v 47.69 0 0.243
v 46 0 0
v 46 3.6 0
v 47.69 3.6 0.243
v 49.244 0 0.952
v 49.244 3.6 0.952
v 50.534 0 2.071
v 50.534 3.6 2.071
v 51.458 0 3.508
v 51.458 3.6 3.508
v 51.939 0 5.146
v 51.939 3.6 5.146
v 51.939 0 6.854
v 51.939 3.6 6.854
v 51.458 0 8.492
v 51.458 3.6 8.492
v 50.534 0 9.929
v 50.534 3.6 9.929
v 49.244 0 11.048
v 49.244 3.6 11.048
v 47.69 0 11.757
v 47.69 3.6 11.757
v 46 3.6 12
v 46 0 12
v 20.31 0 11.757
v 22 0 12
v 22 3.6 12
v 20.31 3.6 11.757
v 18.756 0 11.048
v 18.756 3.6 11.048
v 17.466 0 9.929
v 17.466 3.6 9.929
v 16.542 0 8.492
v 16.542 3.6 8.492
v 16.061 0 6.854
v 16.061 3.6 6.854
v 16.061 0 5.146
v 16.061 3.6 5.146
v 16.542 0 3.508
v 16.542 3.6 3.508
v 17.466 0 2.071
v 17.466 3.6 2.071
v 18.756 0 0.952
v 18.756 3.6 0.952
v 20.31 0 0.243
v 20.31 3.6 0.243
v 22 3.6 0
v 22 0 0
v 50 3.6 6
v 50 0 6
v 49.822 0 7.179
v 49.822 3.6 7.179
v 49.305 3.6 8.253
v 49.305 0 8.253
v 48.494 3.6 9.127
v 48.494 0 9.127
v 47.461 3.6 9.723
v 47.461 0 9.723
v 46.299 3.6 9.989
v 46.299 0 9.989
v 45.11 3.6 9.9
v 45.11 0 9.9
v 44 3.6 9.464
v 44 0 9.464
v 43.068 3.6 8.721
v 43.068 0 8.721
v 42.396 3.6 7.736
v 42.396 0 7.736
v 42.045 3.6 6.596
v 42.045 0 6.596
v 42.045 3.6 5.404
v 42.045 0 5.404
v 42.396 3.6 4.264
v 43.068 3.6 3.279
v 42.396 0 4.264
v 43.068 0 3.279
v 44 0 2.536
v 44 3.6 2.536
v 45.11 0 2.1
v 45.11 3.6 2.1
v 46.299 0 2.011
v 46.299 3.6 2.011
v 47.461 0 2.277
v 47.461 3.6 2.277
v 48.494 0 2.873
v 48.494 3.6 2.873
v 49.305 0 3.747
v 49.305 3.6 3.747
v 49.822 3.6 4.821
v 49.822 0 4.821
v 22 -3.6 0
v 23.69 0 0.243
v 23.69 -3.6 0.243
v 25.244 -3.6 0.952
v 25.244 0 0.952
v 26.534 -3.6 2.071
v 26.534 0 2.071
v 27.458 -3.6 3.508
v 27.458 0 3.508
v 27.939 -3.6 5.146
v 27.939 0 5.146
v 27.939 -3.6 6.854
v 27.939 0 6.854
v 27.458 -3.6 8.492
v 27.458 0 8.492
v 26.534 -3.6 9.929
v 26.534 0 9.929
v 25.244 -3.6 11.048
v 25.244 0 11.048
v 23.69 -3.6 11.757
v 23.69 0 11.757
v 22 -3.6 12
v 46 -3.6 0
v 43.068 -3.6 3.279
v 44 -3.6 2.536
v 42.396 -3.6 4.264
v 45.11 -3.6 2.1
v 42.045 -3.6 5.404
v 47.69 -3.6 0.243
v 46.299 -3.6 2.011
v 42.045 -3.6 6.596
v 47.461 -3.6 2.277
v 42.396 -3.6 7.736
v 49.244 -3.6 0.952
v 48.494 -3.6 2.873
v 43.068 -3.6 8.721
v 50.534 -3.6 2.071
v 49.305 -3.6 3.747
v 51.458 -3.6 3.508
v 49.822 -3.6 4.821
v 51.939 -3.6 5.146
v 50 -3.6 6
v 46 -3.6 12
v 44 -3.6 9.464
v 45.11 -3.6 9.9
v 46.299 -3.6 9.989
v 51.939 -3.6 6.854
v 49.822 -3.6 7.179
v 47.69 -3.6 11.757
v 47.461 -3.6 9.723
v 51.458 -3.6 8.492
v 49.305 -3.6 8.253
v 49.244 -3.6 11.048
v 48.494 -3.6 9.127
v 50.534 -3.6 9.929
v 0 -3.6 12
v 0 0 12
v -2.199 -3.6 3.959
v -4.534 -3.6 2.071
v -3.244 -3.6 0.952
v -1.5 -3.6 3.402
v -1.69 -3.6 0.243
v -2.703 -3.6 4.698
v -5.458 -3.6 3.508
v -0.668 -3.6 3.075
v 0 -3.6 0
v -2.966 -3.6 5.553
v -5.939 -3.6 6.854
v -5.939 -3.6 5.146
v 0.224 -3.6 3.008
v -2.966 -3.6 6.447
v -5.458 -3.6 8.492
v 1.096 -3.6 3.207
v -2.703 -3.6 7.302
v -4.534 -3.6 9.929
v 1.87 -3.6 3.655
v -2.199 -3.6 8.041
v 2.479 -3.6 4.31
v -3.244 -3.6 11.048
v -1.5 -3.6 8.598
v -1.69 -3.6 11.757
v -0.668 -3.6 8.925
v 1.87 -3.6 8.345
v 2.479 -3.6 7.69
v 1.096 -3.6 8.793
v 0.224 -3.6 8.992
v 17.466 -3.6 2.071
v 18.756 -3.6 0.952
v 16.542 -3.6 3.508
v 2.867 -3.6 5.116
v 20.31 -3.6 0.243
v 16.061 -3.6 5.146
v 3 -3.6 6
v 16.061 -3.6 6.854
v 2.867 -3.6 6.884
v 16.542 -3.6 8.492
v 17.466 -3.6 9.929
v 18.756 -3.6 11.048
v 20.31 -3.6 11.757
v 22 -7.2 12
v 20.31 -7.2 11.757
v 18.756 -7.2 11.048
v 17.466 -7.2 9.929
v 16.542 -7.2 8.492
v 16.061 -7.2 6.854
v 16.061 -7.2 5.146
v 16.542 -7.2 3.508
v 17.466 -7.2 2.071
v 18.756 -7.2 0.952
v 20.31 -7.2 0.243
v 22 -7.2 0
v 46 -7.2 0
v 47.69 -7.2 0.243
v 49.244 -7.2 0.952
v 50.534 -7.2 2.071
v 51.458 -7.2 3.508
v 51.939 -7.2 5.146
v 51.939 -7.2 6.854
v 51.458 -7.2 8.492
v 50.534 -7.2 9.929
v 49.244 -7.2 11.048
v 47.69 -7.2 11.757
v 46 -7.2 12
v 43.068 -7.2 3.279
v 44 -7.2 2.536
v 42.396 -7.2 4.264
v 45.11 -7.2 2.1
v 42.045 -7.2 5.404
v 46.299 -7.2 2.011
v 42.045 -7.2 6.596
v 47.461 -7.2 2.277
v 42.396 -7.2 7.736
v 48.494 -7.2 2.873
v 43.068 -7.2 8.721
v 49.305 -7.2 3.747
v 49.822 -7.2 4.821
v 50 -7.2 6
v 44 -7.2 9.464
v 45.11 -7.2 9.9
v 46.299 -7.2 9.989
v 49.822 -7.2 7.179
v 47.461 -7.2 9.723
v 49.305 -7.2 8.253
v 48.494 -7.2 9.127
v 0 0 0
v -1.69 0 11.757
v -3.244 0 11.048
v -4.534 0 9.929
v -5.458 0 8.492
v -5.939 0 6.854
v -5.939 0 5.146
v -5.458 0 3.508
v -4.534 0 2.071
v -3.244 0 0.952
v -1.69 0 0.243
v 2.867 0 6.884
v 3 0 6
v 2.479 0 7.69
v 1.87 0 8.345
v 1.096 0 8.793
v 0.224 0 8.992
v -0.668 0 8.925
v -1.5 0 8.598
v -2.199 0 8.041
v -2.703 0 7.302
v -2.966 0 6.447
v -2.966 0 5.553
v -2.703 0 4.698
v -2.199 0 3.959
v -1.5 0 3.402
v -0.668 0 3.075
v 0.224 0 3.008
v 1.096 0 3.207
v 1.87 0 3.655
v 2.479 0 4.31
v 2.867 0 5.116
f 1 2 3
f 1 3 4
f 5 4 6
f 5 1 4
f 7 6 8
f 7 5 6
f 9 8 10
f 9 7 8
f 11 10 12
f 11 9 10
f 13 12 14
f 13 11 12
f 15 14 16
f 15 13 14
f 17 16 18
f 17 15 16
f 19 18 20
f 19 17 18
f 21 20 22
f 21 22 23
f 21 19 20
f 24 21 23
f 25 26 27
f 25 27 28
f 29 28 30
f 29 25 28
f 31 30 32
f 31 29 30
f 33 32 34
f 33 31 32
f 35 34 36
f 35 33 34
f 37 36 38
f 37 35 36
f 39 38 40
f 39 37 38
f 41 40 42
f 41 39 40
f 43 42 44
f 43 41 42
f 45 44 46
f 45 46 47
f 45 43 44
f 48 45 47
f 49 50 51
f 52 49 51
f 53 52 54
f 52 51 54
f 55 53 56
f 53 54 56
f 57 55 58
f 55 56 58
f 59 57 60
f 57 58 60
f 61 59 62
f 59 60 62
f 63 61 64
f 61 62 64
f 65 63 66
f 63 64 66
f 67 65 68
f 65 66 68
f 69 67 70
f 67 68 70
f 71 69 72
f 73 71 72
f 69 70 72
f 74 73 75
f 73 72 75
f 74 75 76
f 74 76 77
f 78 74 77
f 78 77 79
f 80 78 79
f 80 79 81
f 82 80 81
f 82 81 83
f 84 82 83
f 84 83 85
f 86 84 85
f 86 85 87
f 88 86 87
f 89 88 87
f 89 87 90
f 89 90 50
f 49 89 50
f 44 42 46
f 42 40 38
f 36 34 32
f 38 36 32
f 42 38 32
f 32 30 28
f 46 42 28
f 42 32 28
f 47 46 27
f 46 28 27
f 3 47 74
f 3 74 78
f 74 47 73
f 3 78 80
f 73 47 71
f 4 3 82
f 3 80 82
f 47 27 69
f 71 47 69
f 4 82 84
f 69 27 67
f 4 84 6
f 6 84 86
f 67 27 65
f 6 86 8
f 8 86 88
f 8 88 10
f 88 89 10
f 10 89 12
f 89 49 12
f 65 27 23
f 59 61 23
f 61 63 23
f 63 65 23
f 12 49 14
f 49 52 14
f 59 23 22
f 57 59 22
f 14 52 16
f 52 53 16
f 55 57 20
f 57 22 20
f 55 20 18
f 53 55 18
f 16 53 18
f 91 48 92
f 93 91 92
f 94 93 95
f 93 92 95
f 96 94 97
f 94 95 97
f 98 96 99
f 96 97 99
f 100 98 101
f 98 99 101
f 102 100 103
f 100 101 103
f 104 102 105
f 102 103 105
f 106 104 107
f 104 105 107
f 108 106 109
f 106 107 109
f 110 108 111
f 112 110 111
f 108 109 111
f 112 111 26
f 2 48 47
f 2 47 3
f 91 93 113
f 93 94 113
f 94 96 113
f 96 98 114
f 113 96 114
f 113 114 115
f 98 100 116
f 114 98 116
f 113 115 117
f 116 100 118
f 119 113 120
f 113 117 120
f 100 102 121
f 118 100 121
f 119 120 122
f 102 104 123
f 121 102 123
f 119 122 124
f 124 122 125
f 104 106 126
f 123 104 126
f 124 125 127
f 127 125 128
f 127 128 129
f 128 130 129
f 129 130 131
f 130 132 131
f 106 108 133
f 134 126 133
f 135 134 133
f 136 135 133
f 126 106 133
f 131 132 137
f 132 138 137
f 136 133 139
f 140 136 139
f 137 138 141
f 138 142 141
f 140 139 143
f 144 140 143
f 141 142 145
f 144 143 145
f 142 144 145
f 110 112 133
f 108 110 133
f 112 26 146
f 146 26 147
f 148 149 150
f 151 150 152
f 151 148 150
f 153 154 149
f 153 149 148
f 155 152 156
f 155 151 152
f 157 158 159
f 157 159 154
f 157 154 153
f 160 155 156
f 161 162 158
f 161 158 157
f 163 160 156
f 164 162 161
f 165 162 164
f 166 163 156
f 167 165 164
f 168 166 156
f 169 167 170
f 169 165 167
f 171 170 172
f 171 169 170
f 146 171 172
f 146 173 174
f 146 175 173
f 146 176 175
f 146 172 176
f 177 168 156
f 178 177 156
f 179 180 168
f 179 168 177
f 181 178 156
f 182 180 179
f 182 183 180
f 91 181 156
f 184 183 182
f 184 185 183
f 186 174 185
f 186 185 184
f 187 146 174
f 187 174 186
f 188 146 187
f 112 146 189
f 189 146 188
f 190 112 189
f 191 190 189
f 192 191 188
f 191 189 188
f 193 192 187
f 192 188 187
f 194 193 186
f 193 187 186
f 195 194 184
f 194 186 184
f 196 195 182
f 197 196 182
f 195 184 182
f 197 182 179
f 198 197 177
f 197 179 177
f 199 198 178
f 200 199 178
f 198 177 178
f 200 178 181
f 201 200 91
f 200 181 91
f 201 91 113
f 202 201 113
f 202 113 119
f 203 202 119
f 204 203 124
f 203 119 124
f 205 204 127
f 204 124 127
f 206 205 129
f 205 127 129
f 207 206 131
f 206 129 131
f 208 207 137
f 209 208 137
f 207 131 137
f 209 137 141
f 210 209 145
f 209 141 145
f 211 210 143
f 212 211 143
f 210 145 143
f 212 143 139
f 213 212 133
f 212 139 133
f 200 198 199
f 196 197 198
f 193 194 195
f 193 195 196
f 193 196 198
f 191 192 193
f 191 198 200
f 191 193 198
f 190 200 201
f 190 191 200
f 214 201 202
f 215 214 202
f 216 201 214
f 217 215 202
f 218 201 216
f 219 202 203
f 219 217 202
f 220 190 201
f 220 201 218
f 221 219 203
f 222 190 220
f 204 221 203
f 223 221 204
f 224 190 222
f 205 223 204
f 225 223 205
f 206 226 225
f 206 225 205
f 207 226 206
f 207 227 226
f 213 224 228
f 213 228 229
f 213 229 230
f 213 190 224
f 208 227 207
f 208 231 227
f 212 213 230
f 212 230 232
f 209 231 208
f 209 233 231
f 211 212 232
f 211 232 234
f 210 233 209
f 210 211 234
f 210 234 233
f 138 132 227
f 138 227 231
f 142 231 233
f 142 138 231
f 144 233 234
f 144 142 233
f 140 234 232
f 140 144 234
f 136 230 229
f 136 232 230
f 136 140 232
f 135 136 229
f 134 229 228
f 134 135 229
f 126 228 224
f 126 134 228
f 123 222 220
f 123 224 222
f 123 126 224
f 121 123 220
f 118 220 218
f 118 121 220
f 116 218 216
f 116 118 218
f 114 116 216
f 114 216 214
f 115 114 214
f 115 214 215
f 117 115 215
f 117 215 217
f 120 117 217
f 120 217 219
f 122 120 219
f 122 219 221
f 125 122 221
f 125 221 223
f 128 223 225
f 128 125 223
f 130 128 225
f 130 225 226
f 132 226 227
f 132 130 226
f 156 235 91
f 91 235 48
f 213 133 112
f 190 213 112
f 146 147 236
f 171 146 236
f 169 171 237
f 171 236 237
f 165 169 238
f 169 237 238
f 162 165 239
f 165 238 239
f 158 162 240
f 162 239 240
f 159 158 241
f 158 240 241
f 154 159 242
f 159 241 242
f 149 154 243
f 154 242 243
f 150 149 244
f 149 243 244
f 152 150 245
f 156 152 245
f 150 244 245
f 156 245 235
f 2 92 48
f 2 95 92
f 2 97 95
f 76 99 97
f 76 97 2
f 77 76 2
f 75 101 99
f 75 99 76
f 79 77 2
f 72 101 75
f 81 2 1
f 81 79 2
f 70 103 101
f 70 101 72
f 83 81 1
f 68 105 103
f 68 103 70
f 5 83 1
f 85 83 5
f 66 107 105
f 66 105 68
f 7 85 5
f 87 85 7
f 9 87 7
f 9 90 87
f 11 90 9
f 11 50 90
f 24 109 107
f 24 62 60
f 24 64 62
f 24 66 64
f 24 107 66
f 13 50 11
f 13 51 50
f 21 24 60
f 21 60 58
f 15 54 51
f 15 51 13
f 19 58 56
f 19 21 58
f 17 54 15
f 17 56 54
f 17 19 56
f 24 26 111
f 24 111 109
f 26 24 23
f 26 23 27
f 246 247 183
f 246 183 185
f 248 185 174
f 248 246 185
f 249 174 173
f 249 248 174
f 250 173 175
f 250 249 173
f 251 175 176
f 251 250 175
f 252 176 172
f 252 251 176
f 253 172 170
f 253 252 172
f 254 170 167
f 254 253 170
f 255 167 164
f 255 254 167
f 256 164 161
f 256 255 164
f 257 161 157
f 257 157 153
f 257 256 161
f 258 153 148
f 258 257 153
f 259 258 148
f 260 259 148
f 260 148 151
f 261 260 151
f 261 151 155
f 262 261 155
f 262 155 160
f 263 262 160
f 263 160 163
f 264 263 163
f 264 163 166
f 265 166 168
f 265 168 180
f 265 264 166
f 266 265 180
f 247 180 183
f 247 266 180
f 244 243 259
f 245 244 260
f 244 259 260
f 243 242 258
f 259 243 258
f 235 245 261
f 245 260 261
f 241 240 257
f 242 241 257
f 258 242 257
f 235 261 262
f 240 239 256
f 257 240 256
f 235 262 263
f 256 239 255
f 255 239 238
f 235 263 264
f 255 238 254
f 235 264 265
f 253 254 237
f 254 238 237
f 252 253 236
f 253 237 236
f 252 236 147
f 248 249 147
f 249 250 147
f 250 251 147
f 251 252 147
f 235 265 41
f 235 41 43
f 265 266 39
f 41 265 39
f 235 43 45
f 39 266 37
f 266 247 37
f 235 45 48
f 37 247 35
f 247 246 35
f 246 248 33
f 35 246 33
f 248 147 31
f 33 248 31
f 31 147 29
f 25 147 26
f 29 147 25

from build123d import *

# Parameters (mm, degrees)
F0_R          = 3
F1_DEPTH      = 3.6
F3_DEPTH      = 3.6
F5_DEPTH      = 3.6
F6_R          = 4
F7_DEPTH      = 7.201
F7_DEPTH_BACK = 3.601


with BuildPart() as f1:
    # F0 (on Front) → F1 (new body)
    with BuildSketch(Plane.XZ):
        with BuildLine():
            Line((22, 12), (0, 12))
            ThreePointArc((0, 12), (-6, 6), (0, 0))
            Line((0, 0), (22, 0))
            ThreePointArc((22, 0), (28, 6), (22, 12))
        make_face()
        with Locations((0, 6)):
            Circle(F0_R, mode=Mode.SUBTRACT)
    extrude(amount=F1_DEPTH)

    # F2 (on Front) → F3 (join)
    with BuildSketch(Plane.XZ):
        with BuildLine():
            Line((46, 12), (22, 12))
            ThreePointArc((22, 12), (16, 6), (22, 0))
            Line((22, 0), (46, 0))
            ThreePointArc((46, 0), (52, 6), (46, 12))
        make_face()
    extrude(amount=-F3_DEPTH)

    # F4 (on face) → F5 (join)
    with BuildSketch(Plane.XZ.offset(3.6)):
        with BuildLine():
            Line((46, 12), (22, 12))
            ThreePointArc((22, 12), (16, 6), (22, 0))
            Line((22, 0), (46, 0))
            ThreePointArc((46, 0), (52, 6), (46, 12))
        make_face()
    extrude(amount=F5_DEPTH)

    # F6 (on face) → F7 (cut, two sides)
    with BuildSketch(Plane.XZ) as f7_sk:
        with Locations((46, 6)):
            Circle(F6_R)
    extrude(amount=F7_DEPTH, mode=Mode.SUBTRACT)
    extrude(f7_sk.sketch, amount=-F7_DEPTH_BACK, mode=Mode.SUBTRACT)


solid = f1.part
